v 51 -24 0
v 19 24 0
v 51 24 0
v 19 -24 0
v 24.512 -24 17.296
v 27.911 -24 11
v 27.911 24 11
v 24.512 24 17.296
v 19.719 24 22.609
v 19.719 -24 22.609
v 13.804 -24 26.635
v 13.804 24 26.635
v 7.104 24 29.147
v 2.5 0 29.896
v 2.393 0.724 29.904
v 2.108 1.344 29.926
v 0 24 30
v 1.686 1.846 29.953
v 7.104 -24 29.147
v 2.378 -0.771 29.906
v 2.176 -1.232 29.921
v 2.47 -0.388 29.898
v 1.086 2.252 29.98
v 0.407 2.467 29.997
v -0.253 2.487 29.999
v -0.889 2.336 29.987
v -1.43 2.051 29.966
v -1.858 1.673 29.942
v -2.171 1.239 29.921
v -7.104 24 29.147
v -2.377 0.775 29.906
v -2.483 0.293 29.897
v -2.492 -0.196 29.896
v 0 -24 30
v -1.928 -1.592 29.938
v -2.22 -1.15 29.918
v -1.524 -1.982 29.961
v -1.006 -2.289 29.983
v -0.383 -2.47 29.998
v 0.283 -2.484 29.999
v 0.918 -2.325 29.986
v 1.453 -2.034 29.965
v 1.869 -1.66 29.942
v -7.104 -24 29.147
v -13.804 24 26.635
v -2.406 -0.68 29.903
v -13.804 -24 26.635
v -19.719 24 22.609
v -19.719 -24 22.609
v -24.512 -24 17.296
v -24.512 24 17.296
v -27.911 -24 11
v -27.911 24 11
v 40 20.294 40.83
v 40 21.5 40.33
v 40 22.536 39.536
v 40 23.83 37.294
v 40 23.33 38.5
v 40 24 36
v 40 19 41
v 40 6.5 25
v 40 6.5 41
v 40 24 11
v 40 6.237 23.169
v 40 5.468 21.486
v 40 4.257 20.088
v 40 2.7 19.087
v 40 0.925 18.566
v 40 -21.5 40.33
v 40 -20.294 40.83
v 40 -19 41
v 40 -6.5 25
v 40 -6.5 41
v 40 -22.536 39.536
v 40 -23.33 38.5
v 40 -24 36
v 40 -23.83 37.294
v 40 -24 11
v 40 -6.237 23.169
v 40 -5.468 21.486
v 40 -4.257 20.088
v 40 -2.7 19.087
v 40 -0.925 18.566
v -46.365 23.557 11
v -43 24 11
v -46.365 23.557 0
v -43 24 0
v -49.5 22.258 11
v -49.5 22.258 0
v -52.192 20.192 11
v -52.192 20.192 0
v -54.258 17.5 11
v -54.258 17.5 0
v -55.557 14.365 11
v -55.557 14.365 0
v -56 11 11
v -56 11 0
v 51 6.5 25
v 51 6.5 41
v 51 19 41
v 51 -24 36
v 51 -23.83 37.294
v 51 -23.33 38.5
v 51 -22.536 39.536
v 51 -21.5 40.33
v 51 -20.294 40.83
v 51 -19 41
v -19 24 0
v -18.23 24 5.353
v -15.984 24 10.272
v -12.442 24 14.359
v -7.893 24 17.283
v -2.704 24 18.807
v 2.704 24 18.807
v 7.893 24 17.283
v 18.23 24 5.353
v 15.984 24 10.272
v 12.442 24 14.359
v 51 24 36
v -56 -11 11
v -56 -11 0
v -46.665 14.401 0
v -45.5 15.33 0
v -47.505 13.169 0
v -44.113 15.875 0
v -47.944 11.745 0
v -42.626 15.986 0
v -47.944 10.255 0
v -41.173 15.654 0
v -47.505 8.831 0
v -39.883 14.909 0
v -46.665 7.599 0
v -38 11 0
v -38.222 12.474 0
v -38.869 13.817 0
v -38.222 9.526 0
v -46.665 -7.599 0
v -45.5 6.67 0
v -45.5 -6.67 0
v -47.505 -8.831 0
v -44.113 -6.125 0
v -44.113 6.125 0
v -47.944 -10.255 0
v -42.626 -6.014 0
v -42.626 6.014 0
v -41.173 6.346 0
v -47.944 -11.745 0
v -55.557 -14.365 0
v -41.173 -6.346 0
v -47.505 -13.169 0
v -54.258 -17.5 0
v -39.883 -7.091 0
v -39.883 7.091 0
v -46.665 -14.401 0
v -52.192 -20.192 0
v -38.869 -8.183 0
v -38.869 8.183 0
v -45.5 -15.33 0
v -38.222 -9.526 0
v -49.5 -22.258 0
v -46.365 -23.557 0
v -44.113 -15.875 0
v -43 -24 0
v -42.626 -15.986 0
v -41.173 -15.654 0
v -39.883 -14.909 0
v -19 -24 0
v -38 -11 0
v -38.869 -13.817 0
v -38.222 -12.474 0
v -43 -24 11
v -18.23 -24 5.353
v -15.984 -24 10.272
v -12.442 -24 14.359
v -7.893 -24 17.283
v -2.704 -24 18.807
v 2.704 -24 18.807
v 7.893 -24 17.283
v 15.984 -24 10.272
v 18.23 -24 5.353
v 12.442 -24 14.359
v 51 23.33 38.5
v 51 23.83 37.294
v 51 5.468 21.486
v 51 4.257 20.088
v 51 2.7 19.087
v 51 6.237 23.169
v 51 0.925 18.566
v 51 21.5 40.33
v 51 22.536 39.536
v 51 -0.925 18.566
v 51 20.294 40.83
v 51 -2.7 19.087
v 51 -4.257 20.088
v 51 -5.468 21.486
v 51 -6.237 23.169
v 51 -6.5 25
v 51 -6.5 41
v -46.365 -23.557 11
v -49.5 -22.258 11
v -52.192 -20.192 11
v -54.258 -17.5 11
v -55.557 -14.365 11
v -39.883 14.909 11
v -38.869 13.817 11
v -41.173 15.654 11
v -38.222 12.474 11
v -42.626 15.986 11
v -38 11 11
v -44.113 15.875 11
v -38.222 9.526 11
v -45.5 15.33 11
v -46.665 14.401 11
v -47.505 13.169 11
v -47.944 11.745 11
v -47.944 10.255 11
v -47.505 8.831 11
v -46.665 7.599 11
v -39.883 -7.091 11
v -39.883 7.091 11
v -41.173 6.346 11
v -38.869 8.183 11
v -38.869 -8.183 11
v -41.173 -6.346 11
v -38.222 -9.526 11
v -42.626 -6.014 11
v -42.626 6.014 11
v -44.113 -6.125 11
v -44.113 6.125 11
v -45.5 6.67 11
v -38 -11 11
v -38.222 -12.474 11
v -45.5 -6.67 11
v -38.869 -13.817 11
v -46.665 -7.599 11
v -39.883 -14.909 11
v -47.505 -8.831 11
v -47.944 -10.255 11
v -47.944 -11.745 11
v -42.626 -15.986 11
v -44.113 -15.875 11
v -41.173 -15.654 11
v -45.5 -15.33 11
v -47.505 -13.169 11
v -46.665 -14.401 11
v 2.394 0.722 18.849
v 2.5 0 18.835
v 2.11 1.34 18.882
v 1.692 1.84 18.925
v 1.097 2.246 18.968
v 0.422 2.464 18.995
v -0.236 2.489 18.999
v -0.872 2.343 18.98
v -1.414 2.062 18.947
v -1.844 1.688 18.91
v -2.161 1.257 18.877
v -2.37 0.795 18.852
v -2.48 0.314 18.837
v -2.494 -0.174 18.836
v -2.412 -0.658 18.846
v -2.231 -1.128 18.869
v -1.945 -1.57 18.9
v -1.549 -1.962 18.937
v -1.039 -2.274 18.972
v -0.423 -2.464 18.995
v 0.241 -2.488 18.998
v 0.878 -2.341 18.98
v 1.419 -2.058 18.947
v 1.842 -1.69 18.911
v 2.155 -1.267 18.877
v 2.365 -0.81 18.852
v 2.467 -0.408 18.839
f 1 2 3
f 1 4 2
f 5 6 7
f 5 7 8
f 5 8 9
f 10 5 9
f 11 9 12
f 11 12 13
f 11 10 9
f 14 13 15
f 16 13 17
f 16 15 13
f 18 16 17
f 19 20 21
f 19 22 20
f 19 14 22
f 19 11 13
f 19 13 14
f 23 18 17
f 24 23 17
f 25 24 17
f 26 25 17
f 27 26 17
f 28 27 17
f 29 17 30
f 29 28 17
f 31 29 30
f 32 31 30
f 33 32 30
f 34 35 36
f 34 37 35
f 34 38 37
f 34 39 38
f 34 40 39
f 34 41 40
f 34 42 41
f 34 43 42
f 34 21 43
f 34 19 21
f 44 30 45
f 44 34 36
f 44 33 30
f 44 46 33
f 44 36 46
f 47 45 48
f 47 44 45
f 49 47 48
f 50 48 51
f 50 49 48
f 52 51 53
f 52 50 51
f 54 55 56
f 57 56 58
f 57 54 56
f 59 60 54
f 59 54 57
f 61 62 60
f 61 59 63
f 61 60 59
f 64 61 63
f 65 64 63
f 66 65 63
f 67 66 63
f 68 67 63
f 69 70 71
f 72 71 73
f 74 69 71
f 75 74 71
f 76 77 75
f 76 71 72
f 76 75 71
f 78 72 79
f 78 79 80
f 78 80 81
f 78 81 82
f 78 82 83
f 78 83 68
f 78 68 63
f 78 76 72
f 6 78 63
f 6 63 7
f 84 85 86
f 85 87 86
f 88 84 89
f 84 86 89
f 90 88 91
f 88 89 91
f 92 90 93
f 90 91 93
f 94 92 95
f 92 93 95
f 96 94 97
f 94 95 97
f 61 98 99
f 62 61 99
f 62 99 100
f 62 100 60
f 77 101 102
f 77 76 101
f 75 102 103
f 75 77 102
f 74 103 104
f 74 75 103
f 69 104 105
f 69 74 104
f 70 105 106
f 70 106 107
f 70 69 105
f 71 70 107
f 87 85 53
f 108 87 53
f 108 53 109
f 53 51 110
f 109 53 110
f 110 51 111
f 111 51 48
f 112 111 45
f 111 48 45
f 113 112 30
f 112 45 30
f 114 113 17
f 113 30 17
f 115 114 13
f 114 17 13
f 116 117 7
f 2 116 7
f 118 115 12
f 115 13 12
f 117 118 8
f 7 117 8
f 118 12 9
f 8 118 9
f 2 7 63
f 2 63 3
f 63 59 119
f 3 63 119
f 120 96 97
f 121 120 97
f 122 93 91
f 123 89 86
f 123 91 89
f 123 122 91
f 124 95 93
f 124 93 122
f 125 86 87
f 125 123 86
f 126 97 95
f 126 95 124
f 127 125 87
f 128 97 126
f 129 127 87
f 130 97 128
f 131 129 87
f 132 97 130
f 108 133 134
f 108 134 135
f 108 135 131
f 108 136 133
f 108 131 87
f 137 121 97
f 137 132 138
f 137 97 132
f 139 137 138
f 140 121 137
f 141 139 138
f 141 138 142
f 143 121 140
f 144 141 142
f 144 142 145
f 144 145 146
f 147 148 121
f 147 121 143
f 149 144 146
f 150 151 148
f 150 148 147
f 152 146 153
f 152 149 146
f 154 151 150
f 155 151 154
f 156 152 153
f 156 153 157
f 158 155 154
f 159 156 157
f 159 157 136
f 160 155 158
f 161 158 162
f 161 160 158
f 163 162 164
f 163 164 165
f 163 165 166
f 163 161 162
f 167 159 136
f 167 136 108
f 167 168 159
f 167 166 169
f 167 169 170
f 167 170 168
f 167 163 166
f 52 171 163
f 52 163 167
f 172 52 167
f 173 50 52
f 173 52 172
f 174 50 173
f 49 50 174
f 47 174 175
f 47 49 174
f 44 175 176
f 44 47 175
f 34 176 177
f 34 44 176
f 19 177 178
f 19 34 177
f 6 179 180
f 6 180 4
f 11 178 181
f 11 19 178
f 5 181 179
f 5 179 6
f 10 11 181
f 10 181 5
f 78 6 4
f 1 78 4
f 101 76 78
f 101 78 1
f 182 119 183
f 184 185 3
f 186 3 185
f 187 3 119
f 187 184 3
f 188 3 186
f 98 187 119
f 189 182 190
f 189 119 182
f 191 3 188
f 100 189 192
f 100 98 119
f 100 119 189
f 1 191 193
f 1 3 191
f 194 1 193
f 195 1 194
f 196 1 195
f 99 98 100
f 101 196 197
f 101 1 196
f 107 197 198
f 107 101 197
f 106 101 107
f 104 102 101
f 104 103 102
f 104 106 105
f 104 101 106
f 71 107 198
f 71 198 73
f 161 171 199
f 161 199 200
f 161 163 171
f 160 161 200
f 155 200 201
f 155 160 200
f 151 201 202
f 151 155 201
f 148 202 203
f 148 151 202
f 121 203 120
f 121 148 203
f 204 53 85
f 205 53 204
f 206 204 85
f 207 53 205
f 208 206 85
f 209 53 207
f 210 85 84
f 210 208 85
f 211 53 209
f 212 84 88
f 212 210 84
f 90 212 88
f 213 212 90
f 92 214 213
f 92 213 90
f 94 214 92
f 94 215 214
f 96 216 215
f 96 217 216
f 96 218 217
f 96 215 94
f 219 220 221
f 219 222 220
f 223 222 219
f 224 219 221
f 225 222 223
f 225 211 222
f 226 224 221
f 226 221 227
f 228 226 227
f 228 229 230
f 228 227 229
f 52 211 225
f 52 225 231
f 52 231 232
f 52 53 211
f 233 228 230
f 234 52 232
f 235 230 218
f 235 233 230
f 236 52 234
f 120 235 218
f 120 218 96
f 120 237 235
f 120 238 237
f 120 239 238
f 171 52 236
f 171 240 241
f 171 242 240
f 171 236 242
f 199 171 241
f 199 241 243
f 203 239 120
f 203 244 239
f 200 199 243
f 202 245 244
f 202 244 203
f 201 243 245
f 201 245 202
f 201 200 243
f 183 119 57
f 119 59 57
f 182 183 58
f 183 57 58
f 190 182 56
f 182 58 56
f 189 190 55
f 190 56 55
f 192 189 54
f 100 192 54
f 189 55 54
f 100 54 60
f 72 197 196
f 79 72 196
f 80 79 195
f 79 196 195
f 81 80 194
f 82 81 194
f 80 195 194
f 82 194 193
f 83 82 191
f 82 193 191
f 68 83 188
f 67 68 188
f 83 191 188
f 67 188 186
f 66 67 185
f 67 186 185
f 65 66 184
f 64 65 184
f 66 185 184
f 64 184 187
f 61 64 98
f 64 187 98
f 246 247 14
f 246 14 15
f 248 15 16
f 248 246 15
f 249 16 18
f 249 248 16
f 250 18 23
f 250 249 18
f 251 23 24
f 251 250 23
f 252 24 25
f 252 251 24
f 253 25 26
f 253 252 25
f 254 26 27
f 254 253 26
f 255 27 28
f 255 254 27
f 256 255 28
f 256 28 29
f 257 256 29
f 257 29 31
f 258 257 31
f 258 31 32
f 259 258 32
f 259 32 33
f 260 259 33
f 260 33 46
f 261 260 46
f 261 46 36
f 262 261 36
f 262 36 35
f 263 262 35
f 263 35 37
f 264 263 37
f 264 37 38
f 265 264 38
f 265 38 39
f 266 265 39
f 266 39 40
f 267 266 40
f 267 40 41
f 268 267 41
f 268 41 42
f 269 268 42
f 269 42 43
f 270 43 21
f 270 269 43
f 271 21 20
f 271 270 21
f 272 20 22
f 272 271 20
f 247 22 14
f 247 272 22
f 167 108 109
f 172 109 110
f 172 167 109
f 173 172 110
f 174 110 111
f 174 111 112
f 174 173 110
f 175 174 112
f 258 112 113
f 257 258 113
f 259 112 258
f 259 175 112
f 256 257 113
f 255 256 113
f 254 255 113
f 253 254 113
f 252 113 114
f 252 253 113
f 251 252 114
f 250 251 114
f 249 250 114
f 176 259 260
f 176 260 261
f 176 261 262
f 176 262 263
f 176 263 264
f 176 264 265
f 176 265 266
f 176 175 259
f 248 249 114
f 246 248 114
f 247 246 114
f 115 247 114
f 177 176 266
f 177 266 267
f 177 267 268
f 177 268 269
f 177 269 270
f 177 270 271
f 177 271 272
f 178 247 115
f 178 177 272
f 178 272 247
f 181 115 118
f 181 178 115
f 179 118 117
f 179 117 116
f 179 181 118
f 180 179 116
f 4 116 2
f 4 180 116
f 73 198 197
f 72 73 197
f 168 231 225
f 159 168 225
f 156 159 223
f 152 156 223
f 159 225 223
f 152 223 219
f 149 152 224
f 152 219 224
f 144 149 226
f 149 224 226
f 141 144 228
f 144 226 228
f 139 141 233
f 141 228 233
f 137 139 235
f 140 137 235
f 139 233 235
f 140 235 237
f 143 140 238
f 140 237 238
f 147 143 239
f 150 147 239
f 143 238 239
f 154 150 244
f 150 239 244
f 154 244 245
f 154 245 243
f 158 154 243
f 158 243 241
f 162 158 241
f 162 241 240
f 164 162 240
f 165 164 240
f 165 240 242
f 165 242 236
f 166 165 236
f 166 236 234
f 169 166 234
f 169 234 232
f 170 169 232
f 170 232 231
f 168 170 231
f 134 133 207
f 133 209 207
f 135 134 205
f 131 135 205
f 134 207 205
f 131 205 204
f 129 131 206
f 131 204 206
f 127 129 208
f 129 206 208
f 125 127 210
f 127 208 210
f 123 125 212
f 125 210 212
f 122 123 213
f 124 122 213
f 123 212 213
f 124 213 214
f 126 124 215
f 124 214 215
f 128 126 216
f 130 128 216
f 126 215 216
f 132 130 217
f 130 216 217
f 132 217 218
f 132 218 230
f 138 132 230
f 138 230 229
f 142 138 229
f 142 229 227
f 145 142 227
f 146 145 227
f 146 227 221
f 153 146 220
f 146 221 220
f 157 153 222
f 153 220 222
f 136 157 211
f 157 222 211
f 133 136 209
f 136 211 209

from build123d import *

# Parameters (mm, degrees)
F1_DEPTH = 24
F3_DEPTH = 11
F5_R     = 13
F6_R     = 5
F4_R     = 2.5
F4_R_2   = 5
F7_DEPTH = 38.1


with BuildPart() as f1:
    # F0 (on Front) → F1 (new body, symmetric)
    with BuildSketch(Plane.XZ):
        with BuildLine():
            Line((19, 0), (51, 0))
            Line((51, 0), (51, 41))
            Line((51, 41), (40, 41))
            Line((40, 41), (40, 11))
            Line((40, 11), (27.910571, 11))
            ThreePointArc((27.910571, 11), (0, 30), (-27.910571, 11))
            Line((-27.910571, 11), (-56, 11))
            Line((-56, 11), (-56, 0))
            Line((-56, 0), (-19, 0))
            ThreePointArc((-19, 0), (0, 19), (19, 0))
        make_face()
    extrude(amount=F1_DEPTH, both=True)

    # F2 (on face) → F3 (cut, through all)
    with BuildSketch(Plane.YZ.offset(51)):
        with BuildLine():
            ThreePointArc((6.5, 25), (0, 31.5), (-6.5, 25))
            ThreePointArc((-6.5, 25), (0, 18.5), (6.5, 25))
        make_face()
        with BuildLine():
            Line((6.5, 41), (-6.5, 41))
            Line((-6.5, 41), (-6.5, 25))
            ThreePointArc((-6.5, 25), (0, 31.5), (6.5, 25))
            Line((6.5, 25), (6.5, 41))
        make_face()
    extrude(amount=-F3_DEPTH, mode=Mode.SUBTRACT)

    # F5
    f5_edges = [f1.edges().sort_by_distance(p)[0] for p in [
        (-56, -24, 5.5),
        (-56, 24, 5.5),
    ]]
    fillet(f5_edges, radius=F5_R)

    # F6
    f6_edges = [f1.edges().sort_by_distance(p)[0] for p in [
        (45.5, -24, 41),
        (45.5, 24, 41),
    ]]
    fillet(f6_edges, radius=F6_R)

    # F4 (on face) → F7 (cut, symmetric)
    with BuildSketch(Plane.XY.offset(11)):
        Circle(F4_R)
        with Locations((-43, -11)):
            Circle(F4_R_2)
        with Locations((-43, 11)):
            Circle(F4_R_2)
    extrude(amount=F7_DEPTH, both=True, mode=Mode.SUBTRACT)


solid = f1.part
